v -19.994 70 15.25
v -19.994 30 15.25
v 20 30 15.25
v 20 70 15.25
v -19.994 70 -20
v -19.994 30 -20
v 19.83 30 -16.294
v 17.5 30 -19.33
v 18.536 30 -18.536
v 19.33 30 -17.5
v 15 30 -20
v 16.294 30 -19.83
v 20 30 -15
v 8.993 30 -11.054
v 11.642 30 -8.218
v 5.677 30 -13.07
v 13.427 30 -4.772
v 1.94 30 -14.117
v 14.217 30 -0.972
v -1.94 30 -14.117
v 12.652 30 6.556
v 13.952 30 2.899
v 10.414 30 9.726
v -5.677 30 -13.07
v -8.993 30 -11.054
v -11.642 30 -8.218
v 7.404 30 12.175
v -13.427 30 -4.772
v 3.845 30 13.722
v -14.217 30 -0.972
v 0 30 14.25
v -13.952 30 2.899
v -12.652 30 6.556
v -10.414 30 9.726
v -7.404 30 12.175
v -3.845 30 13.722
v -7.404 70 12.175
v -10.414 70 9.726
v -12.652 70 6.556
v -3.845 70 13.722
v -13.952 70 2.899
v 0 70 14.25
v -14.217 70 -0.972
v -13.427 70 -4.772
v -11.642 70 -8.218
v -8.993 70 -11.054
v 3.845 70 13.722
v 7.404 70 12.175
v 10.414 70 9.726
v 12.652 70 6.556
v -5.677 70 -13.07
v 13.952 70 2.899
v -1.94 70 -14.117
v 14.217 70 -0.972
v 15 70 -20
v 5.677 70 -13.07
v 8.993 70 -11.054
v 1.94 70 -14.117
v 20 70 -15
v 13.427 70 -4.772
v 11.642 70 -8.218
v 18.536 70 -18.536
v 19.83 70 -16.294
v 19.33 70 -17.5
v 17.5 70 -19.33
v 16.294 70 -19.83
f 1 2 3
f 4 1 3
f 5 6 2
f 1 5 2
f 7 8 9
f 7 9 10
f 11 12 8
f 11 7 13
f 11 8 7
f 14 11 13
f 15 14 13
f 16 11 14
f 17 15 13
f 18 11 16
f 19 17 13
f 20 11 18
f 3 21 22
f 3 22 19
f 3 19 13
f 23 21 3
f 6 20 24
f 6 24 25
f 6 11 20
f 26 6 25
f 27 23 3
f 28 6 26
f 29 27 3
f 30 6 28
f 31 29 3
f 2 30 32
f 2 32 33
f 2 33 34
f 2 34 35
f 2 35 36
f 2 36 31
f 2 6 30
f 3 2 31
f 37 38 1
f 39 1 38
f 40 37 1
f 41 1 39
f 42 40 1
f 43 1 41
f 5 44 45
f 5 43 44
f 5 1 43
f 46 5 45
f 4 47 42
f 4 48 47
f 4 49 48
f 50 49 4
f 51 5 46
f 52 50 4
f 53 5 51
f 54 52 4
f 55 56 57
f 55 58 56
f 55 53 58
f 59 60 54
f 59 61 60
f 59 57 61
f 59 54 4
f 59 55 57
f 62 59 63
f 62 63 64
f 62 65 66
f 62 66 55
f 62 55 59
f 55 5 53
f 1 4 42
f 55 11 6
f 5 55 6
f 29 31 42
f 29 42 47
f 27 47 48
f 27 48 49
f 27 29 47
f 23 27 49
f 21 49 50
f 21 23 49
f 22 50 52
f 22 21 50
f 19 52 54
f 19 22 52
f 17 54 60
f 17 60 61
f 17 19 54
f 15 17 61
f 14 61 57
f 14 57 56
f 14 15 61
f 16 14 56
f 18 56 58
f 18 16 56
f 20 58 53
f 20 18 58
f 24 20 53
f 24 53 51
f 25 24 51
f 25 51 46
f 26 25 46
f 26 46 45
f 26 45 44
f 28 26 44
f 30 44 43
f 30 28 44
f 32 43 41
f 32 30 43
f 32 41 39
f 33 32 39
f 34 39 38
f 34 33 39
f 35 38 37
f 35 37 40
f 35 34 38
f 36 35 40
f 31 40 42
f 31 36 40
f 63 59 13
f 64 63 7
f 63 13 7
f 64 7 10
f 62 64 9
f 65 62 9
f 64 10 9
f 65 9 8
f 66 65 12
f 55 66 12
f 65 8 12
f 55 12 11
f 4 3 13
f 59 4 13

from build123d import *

# Parameters (mm, degrees)
CROQUIS1_R                              = 15.25
CROQUIS1_R_2                            = 2.125
SOPORTE_CAJA_REDUCTORA_DEPTH            = 20
CROQUIS3_R                              = 2.125
CORTAR_EXTRUIR1_DEPTH                   = 51.423828692
REDONDEO1_R                             = 5
BOSS_EXTRUDE1_DEPTH                     = 20
CUT_EXTRUDE1_REACH                      = 55.852
SKETCH2_R                               = 1.625
CUT_EXTRUDE2_DEPTH                      = 2
SKETCH4_R                               = 1.625
CUT_EXTRUDE3_DEPTH                      = 63.291652731
CUT_EXTRUDE4_START                      = -4.5
CUT_EXTRUDE4_DEPTH                      = 2
CROQUIS6_W                              = 4.75
CROQUIS6_H                              = 4.75
CORTAR_EXTRUIR17_DEPTH                  = 42.231056256
CROQUIS7_W                              = 60
CROQUIS7_H                              = 20
CORTAR_EXTRUIR18_DEPTH                  = 51.423828692
SALIENTE_EXTRUIR2_DEPTH                 = 49
SOPORTE_START                           = -15
SOPORTE_MOTOR_DEPTH                     = 15
CROQUIS12_R                             = 2.125
AGUJEROS_DE_SUJECION_A_BASE_DEPTH       = 84.087679592
TUERCA_START                            = -4
TUERCA_AGUJERO_DE_SUJECION_A_BASE_DEPTH = 10
SALIENTE_EXTRUIR4_DEPTH                 = 15
CORTAR_EXTRUIR19_DEPTH                  = 25
CROQUIS14_W                             = 50
CROQUIS14_H                             = 118
CORTAR_EXTRUIR22_DEPTH                  = 146.556045907
CROQUIS15_W                             = 10
CROQUIS15_H                             = 7
CORTAR_EXTRUIR23_DEPTH                  = 42.231056256
CORTAR_EXTRUIR24_DEPTH                  = 42.231056256
CROQUIS18_W                             = 40
CROQUIS18_H                             = 10
CORTAR_EXTRUIR25_DEPTH                  = 44.27311521
SALIENTE_EXTRUIR5_DEPTH                 = 10
CROQUIS20_R                             = 1
CORTAR_EXTRUIR26_DEPTH                  = 49.229270158
CORTAR_EXTRUIR27_REACH                  = 62.959
CORTAR_EXTRUIR27_END_RADIUS             = 15.25
CROQUIS21_R                             = 1.625
CROQUIS22_R                             = 2.125
CROQUIS22_R_2                           = 1
SALIENTE_EXTRUIR6_DEPTH                 = 10
CROQUIS23_R                             = 1.625
CORTAR_EXTRUIR28_DEPTH                  = 52.269508521
CORTAR_EXTRUIR29_START                  = -3
CORTAR_EXTRUIR29_DEPTH                  = 10
SALIENTE_EXTRUIR7_DEPTH                 = 10
CORTAR_EXTRUIR30_REACH                  = 72.235
CROQUIS27_R                             = 1.625
CORTAR_EXTRUIR31_REACH                  = 75.235
CORTAR_EXTRUIR31_START                  = -3
CORTAR_EXTRUIR32_REACH                  = 58.612
CROQUIS29_R                             = 1.625
CORTAR_EXTRUIR33_REACH                  = 61.112
CORTAR_EXTRUIR33_START                  = -2.5
CROQUIS35_W                             = 13.305418987
CROQUIS35_H                             = 6.826864192
CORTAR_EXTRUIR34_DEPTH                  = 63.931555098
CORTAR_EXTRUIR34_DEPTH_BACK             = 63.931555098
CORTAR_EXTRUIR35_START                  = -3
CORTAR_EXTRUIR35_DEPTH                  = 10
SALIENTE_EXTRUIR8_DEPTH                 = 10
SALIENTE_EXTRUIR9_DEPTH                 = 13
SALIENTE_EXTRUIR10_DEPTH                = 3
CROQUIS40_W                             = 106.583537839
CROQUIS40_H                             = 47.391515964
CORTAR_EXTRUIR36_DEPTH                  = 80.887064817
CORTAR_EXTRUIR36_DEPTH_BACK             = 80.887064817
CORTAR_EXTRUIR37_DEPTH                  = 67.2524009
CORTAR_EXTRUIR37_DEPTH_BACK             = 67.2524009
CORTAR_EXTRUIR38_DEPTH                  = 79.704784639
CORTAR_EXTRUIR38_DEPTH_BACK             = 79.704784639
SALIENTE_EXTRUIR11_DEPTH                = 10
CORTAR_EXTRUIR39_DEPTH                  = 63.9908649
CROQUIS45_W                             = 31.470301378
CROQUIS45_H                             = 10
CROQUIS45_R                             = 1.625
SALIENTE_EXTRUIR12_DEPTH                = 2.5
SALIENTE_EXTRUIR13_DEPTH                = 10
CORTAR_EXTRUIR40_START                  = -2
CROQUIS47_R                             = 1.625
CORTAR_EXTRUIR40_DEPTH                  = 10
CORTAR_EXTRUIR41_START                  = -12
CROQUIS48_R                             = 1.625
CORTAR_EXTRUIR41_DEPTH                  = 12
CROQUIS49_W                             = 34.796066513
CROQUIS49_H                             = 42.211026982
CORTAR_EXTRUIR42_DEPTH                  = 52.795622989
CORTAR_EXTRUIR42_DEPTH_BACK             = 52.795622989
CROQUIS51_R                             = 15.25
CROQUIS51_R_2                           = 14.25
SALIENTE_EXTRUIR14_DEPTH                = 10
CORTAR_EXTRUIR43_DEPTH                  = 10
CORTAR_EXTRUIR44_DEPTH                  = 10
CORTAR_EXTRUIR45_DEPTH                  = 10
SALIENTE_EXTRUIR15_DEPTH                = 10
CROQUIS56_R                             = 14.25
SALIENTE_EXTRUIR16_DEPTH                = 40
CROQUIS57_W                             = 35.25
CROQUIS57_H                             = 10
CORTAR_EXTRUIR46_DEPTH                  = 84.0631572
CORTAR_EXTRUIR46_DEPTH_BACK             = 84.0631572


with BuildPart() as part:
    # Croquis1 → Soporte caja reductora (new body)
    with BuildSketch(Plane(origin=(0, 0, 0), x_dir=(1, 0, 0), z_dir=(0, 1, 0))):
        Polygon((-30, -15.25), (-20, -15.25), (-20, -20), (20, -20), (20, -15.25), (30, -15.25), (30, -7.25), (20, -4.25), (20, 20), (-20, 20), (-20, -4.25), (-30, -7.25), align=None)
        with Locations(Location((0, 0, 0), (0, 0, 270))):
            Circle(CROQUIS1_R, mode=Mode.SUBTRACT)
        with Locations(Location((-15, 15, 0), (0, 0, 270))):
            Circle(CROQUIS1_R_2, mode=Mode.SUBTRACT)
        with Locations(Location((15, 15, 0), (0, 0, 270))):
            Circle(CROQUIS1_R_2, mode=Mode.SUBTRACT)
    extrude(amount=-SOPORTE_CAJA_REDUCTORA_DEPTH)

    # Croquis3 → Cortar-Extruir1 (cut, through all)
    with BuildSketch(Plane.XY.offset(15.25)):
        with Locations((-23.5, -10)):
            Circle(CROQUIS3_R)
        with Locations((23.5, -10)):
            Circle(CROQUIS3_R)
    extrude(amount=-CORTAR_EXTRUIR1_DEPTH, mode=Mode.SUBTRACT)

    # Redondeo1
    redondeo1_edges = [part.edges().sort_by_distance(p)[0] for p in [
        (-20, -10, -20),
        (20, -10, -20),
    ]]
    fillet(redondeo1_edges, radius=REDONDEO1_R)

    # Sketch1 → Boss-Extrude1 (add)
    with BuildSketch(Plane(origin=(0, 0, 0), x_dir=(1, 0, 0), z_dir=(0, 1, 0))):
        with BuildLine():
            Line((25.5, 15), (20, 15))
            ThreePointArc((20, 15), (18.535533906, 18.535533906), (15, 20))
            Line((15, 20), (30, 20))
            Line((30, 20), (30, 8))
            Line((30, 8), (25.5, 8))
            Line((25.5, 8), (25.5, 15))
        make_face()
    extrude(amount=-BOSS_EXTRUDE1_DEPTH)

    # Sketch2 → Cut-Extrude1 (cut, up to next)
    with BuildSketch(Plane(origin=(0, 0, -20), x_dir=(-1, 0, 0), z_dir=(0, 0, -1)), mode=Mode.PRIVATE) as cut_extrude1_sk1:
        with Locations((-22.75, -10)):
            Circle(SKETCH2_R)
    cut_extrude1_tool1 = extrude(cut_extrude1_sk1.sketch, amount=-CUT_EXTRUDE1_REACH, mode=Mode.PRIVATE) & part.part
    add(cut_extrude1_tool1.solids().sort_by_distance((22.75, -10, -20))[0], mode=Mode.SUBTRACT)

    # Sketch3 → Cut-Extrude2 (cut)
    with BuildSketch(Plane.XY.offset(-15)):
        Polygon((20, -11.58771324), (22.75, -13.175426481), (25.5, -11.58771324), (25.5, -8.41228676), (22.75, -6.824573519), (20, -8.41228676), align=None)
    extrude(amount=-CUT_EXTRUDE2_DEPTH, mode=Mode.SUBTRACT)

    # Sketch4 → Cut-Extrude3 (cut, through all)
    with BuildSketch(Plane.ZY.offset(-25.5)):
        with Locations((-12.25, -10)):
            Circle(SKETCH4_R)
    extrude(amount=-CUT_EXTRUDE3_DEPTH, mode=Mode.SUBTRACT)

    # Sketch5 → Cut-Extrude4 (cut)
    with BuildSketch(Plane(origin=(30, 0, 0), x_dir=(0, 0, -1), z_dir=(1, 0, 0)).offset(CUT_EXTRUDE4_START)):
        Polygon((15, -11.58771324), (15, -8.41228676), (12.25, -6.824573519), (9.5, -8.41228676), (9.5, -11.58771324), (12.25, -13.175426481), align=None)
    extrude(amount=CUT_EXTRUDE4_DEPTH, mode=Mode.SUBTRACT)

    # Croquis6 → Cortar-Extruir17 (cut, through all)
    with BuildSketch(Plane(origin=(0, 0, 0), x_dir=(1, 0, 0), z_dir=(0, 1, 0))):
        Polygon((0, -15.25), (-15.25, -15.25), (-15.25, -20), (15.25, -20), (15.25, -15.25), align=None)
        with Locations((-17.625, -17.625)):
            Rectangle(CROQUIS6_W, CROQUIS6_H)
        with BuildLine():
            ThreePointArc((0, -15.25), (-10.783378413, -10.783378413), (-15.25, 0))
            Line((-15.25, 0), (-15.25, -15.25))
            Line((-15.25, -15.25), (0, -15.25))
        make_face()
        with BuildLine():
            Line((15.25, -15.25), (15.25, 0))
            ThreePointArc((15.25, 0), (10.783378413, -10.783378413), (0, -15.25))
            Line((0, -15.25), (15.25, -15.25))
        make_face()
        with Locations((17.625, -17.625)):
            Rectangle(CROQUIS6_W, CROQUIS6_H)
    extrude(amount=-CORTAR_EXTRUIR17_DEPTH, mode=Mode.SUBTRACT)


with BuildPart() as body_2:
    # Simetría1: mirrored copy
    add(part.part.mirror(Plane.ZX))

    # Croquis8 → Saliente-Extruir2 (add)
    with BuildSketch(Plane(origin=(0, 20, 0), x_dir=(1, 0, 0), z_dir=(0, 1, 0))):
        with BuildLine():
            Line((-12.664515522, 20), (-11.040489496, 13.939052358))
            Line((-11.040489496, 13.939052358), (-10.315162126, 11.232093763))
            ThreePointArc((-10.315162126, 11.232093763), (0, 15.25), (10.315162126, 11.232093763))
            Line((10.315162126, 11.232093763), (10.817418481, 13.87928066))
            Line((10.817418481, 13.87928066), (11.978715476, 20))
            Line((11.978715476, 20), (-12.664515522, 20))
        make_face()
    extrude(amount=SALIENTE_EXTRUIR2_DEPTH)

    # Croquis9 → Soporte motor (add)
    with BuildSketch(Plane(origin=(0, 69, 0), x_dir=(1, 0, 0), z_dir=(0, 1, 0)).offset(SOPORTE_START)):
        with BuildLine():
            Line((-20, 15), (-20, -4.25))
            Line((-20, -4.25), (-30, -7.25))
            Line((-30, -7.25), (-30, -15.25))
            Line((-30, -15.25), (0, -15.25))
            Line((0, -15.25), (0, -14.75))
            ThreePointArc((0, -14.75), (-10.429825023, 10.429825023), (14.75, 0))
            Line((14.75, 0), (20, 0))
            Line((20, 0), (20, 13.936837101))
            Line((20, 13.936837101), (12.664515522, 20))
            Line((12.664515522, 20), (-15, 20))
            ThreePointArc((-15, 20), (-18.535533906, 18.535533906), (-20, 15))
        make_face()
    extrude(amount=-SOPORTE_MOTOR_DEPTH)

    # Croquis12 → Agujeros de sujecion a base (cut, through all)
    with BuildSketch(Plane.XY.offset(15.25)):
        with Locations((-23.5, 46.5)):
            Circle(CROQUIS12_R)
    extrude(amount=-AGUJEROS_DE_SUJECION_A_BASE_DEPTH, mode=Mode.SUBTRACT)

    # Croquis13 → Tuerca Agujero de sujecion a base (cut)
    with BuildSketch(Plane.XY.offset(15.25).offset(TUERCA_START)):
        Polygon((-20, 44.479274058), (-20, 48.520725942), (-23.5, 50.541451884), (-27, 48.520725942), (-27, 44.479274058), (-23.5, 42.458548116), align=None)
    extrude(amount=-TUERCA_AGUJERO_DE_SUJECION_A_BASE_DEPTH, mode=Mode.SUBTRACT)

    # Croquis10 → Saliente-Extruir4 (add)
    with BuildSketch(Plane(origin=(0, 69, 0), x_dir=(1, 0, 0), z_dir=(0, 1, 0))):
        with BuildLine():
            ThreePointArc((10.315162126, 11.232093763), (0, 15.25), (-10.315162126, 11.232093763))
            Line((-10.315162126, 11.232093763), (-10.16850369, 10.684757026))
            ThreePointArc((-10.16850369, 10.684757026), (0, 14.75), (10.16850369, 10.684757026))
            Line((10.16850369, 10.684757026), (10.315162126, 11.232093763))
        make_face()
    extrude(amount=-SALIENTE_EXTRUIR4_DEPTH)

    # Croquis11 → Cortar-Extruir19 (cut)
    with BuildSketch(Plane.XZ):
        with BuildLine():
            Line((15.25, 4.25), (20, 4.25))
            Line((20, 4.25), (21.972856468, 4.84185694))
            ThreePointArc((21.972856468, 4.84185694), (19.948931102, 10.40625523), (16.543503257, 15.25))
            Line((16.543503257, 15.25), (15.25, 15.25))
            Line((15.25, 15.25), (15.25, 4.25))
        make_face()
        with BuildLine():
            Line((21.972856468, 4.84185694), (30, 7.25))
            Line((30, 7.25), (30, 15.25))
            Line((30, 15.25), (16.543503257, 15.25))
            ThreePointArc((16.543503257, 15.25), (19.948931102, 10.40625523), (21.972856468, 4.84185694))
        make_face()
        with BuildLine():
            ThreePointArc((20, -15), (18.535533906, -18.535533906), (15, -20))
            Line((15, -20), (30, -20))
            Line((30, -20), (30, -8))
            Line((30, -8), (25.5, -8))
            Line((25.5, -8), (25.5, -15))
            Line((25.5, -15), (20, -15))
        make_face()
    extrude(amount=-CORTAR_EXTRUIR19_DEPTH, mode=Mode.SUBTRACT)

    # Simetría2: body 2 across face


with BuildPart() as part_1:
    add(part.part)

    # Croquis7 → Cortar-Extruir18 (cut, through all)
    with BuildSketch(Plane(origin=(0, 0, -20), x_dir=(-1, 0, 0), z_dir=(0, 0, -1))):
        with Locations((0, -10)):
            Rectangle(CROQUIS7_W, CROQUIS7_H)
    extrude(amount=-CORTAR_EXTRUIR18_DEPTH, mode=Mode.SUBTRACT)


with BuildPart() as body_2_1:
    add(body_2.part)
    add(body_2.part.mirror(Plane(origin=(-0.229209569, 69, -16.663998028), x_dir=(0, 0, 1), z_dir=(0, 1, 0))))

    # Croquis14 → Cortar-Extruir22 (cut, through all)
    with BuildSketch(Plane.XY.offset(15.25)):
        with Locations((-5, 79)):
            Rectangle(CROQUIS14_W, CROQUIS14_H)
    extrude(amount=-CORTAR_EXTRUIR22_DEPTH, mode=Mode.SUBTRACT)

    # Croquis15 → Cortar-Extruir23 (cut, through all)
    with BuildSketch(Plane.XZ):
        with Locations((-25, 7.75)):
            Rectangle(CROQUIS15_W, CROQUIS15_H)
    extrude(amount=-CORTAR_EXTRUIR23_DEPTH, mode=Mode.SUBTRACT)

    # Croquis16 → Cortar-Extruir24 (cut, through all)
    with BuildSketch(Plane.XZ):
        Polygon((-30, 15.25), (-15.25, 15.25), (-15.25, 12.75), (-20, 12.75), (-20, 11.25), (-30, 11.25), (-30, 12.75), align=None)
    extrude(amount=-CORTAR_EXTRUIR24_DEPTH, mode=Mode.SUBTRACT)

    # Croquis18 → Cortar-Extruir25 (cut, through all)
    with BuildSketch(Plane(origin=(0, 0, -20), x_dir=(-1, 0, 0), z_dir=(0, 0, -1))):
        with Locations((0, 5)):
            Rectangle(CROQUIS18_W, CROQUIS18_H)
    extrude(amount=-CORTAR_EXTRUIR25_DEPTH, mode=Mode.SUBTRACT)

    # Croquis19 → Saliente-Extruir5 (add)
    with BuildSketch(Plane(origin=(0, 20, 0), x_dir=(1, 0, 0), z_dir=(0, 1, 0))):
        Polygon((-20, -12.75), (-34, -12.75), (-34, -7.75), (-24, -7.75), (-20, -3.75), align=None)
    extrude(amount=-SALIENTE_EXTRUIR5_DEPTH)

    # Croquis20 → Cortar-Extruir26 (cut, through all)
    with BuildSketch(Plane(origin=(0, 0, 7.75), x_dir=(-1, 0, 0), z_dir=(0, 0, -1))):
        with Locations((29, 15)):
            Circle(CROQUIS20_R)
    extrude(amount=-CORTAR_EXTRUIR26_DEPTH, mode=Mode.SUBTRACT)

    # Cortar-Extruir27: up to this cylinder (the profile starts outside it)
    cortar_extruir27_end = Plane(origin=(0, 15, 0), z_dir=(0, -1, 0)) * Cylinder(CORTAR_EXTRUIR27_END_RADIUS, 157.418, mode=Mode.PRIVATE)
    # Croquis21 → Cortar-Extruir27 (cut, up to the surface)
    with BuildSketch(Plane(origin=(20, 0, 0), x_dir=(0, 0, -1), z_dir=(1, 0, 0)), mode=Mode.PRIVATE) as cortar_extruir27_sk1:
        with Locations((4.75, 15)):
            Circle(CROQUIS21_R)
    cortar_extruir27_tool1 = extrude(cortar_extruir27_sk1.sketch, amount=-CORTAR_EXTRUIR27_REACH, mode=Mode.PRIVATE) - cortar_extruir27_end
    add(cortar_extruir27_tool1.solids().sort_by_distance((20, 15, -4.75))[0], mode=Mode.SUBTRACT)

    # Croquis22 → Saliente-Extruir6 (add)
    with BuildSketch(Plane.XZ.offset(-10)):
        with Locations((-15, -15)):
            Circle(CROQUIS22_R)
        with Locations(Location((-15, -15, 0), (0, 0, 270))):
            Circle(CROQUIS22_R_2, mode=Mode.SUBTRACT)
        with Locations((15, -15)):
            Circle(CROQUIS22_R)
        with Locations(Location((15, -15, 0), (0, 0, 270))):
            Circle(CROQUIS22_R_2, mode=Mode.SUBTRACT)
    extrude(amount=-SALIENTE_EXTRUIR6_DEPTH)

    # Croquis23 → Cortar-Extruir28 (cut, through all)
    with BuildSketch(Plane(origin=(0, 0, -20), x_dir=(-1, 0, 0), z_dir=(0, 0, -1))):
        with Locations((0, 15)):
            Circle(CROQUIS23_R)
    extrude(amount=-CORTAR_EXTRUIR28_DEPTH, mode=Mode.SUBTRACT)

    # Croquis24 → Cortar-Extruir29 (cut)
    with BuildSketch(Plane(origin=(0, 0, -20), x_dir=(-1, 0, 0), z_dir=(0, 0, -1)).offset(CORTAR_EXTRUIR29_START)):
        Polygon((1.58771324, 12.25), (3.175426481, 15), (1.58771324, 17.75), (-1.58771324, 17.75), (-3.175426481, 15), (-1.58771324, 12.25), align=None)
    extrude(amount=-CORTAR_EXTRUIR29_DEPTH, mode=Mode.SUBTRACT)

    # Croquis26 → Saliente-Extruir7 (add)
    with BuildSketch(Plane.XZ.offset(-10)):
        Polygon((-34, 7.75), (-34, 12.75), (-58.825, 12.75), (-39.160527763, -4.104491148), (-20, -4.104491148), (-20, -0.104491148), (-35.732113118, -0.104491148), (-29, 7.75), align=None)
        Polygon((-34.268209086, 7.75), (-39.594516123, 1.535690951), (-46.844874897, 7.75), align=None, mode=Mode.SUBTRACT)
    extrude(amount=-SALIENTE_EXTRUIR7_DEPTH)

    # Croquis27 → Cortar-Extruir30 (cut, up to next)
    with BuildSketch(Plane.XY.offset(12.75), mode=Mode.PRIVATE) as cortar_extruir30_sk1:
        with Locations((-40.544874897, 15)):
            Circle(CROQUIS27_R)
    cortar_extruir30_tool1 = extrude(cortar_extruir30_sk1.sketch, amount=-CORTAR_EXTRUIR30_REACH, mode=Mode.PRIVATE) & body_2_1.part
    # Croquis27 → Cortar-Extruir30 (cut, up to next)
    with BuildSketch(Plane.XY.offset(12.75), mode=Mode.PRIVATE) as cortar_extruir30_sk2:
        with Locations((-29, 15)):
            Circle(CROQUIS27_R)
    cortar_extruir30_tool2 = extrude(cortar_extruir30_sk2.sketch, amount=-CORTAR_EXTRUIR30_REACH, mode=Mode.PRIVATE) & body_2_1.part
    add(cortar_extruir30_tool1.solids().sort_by_distance((-40.544875, 15, 12.75))[0], mode=Mode.SUBTRACT)
    add(cortar_extruir30_tool2.solids().sort_by_distance((-29, 15, 12.75))[0], mode=Mode.SUBTRACT)

    # Croquis28 → Cortar-Extruir31 (cut, up to next)
    with BuildSketch(Plane.XY.offset(12.75).offset(CORTAR_EXTRUIR31_START), mode=Mode.PRIVATE) as cortar_extruir31_sk1:
        Polygon((-38.957161657, 12.25), (-37.369448416, 15), (-38.957161657, 17.75), (-42.132588137, 17.75), (-43.720301378, 15), (-42.132588137, 12.25), align=None)
    cortar_extruir31_tool1 = extrude(cortar_extruir31_sk1.sketch, amount=-CORTAR_EXTRUIR31_REACH, mode=Mode.PRIVATE) & body_2_1.part
    # Croquis28 → Cortar-Extruir31 (cut, up to next)
    with BuildSketch(Plane.XY.offset(12.75).offset(CORTAR_EXTRUIR31_START), mode=Mode.PRIVATE) as cortar_extruir31_sk2:
        Polygon((-27.41228676, 12.25), (-25.824573519, 15), (-27.41228676, 17.75), (-30.58771324, 17.75), (-32.175426481, 15), (-30.58771324, 12.25), align=None)
    cortar_extruir31_tool2 = extrude(cortar_extruir31_sk2.sketch, amount=-CORTAR_EXTRUIR31_REACH, mode=Mode.PRIVATE) & body_2_1.part
    add(cortar_extruir31_tool1.solids().sort_by_distance((-40.544875, 15, 9.75))[0], mode=Mode.SUBTRACT)
    add(cortar_extruir31_tool2.solids().sort_by_distance((-29, 15, 9.75))[0], mode=Mode.SUBTRACT)

    # Croquis29 → Cortar-Extruir32 (cut, up to next)
    with BuildSketch(Plane(origin=(-18.612848159, 0, -21.715982563), x_dir=(-0.7592713073348843, 0, 0.6507742172658468), z_dir=(-0.6507742172658468, 0, -0.7592713073348843)), mode=Mode.PRIVATE) as cortar_extruir32_sk1:
        with Locations((33.812368097, 15)):
            Circle(CROQUIS29_R)
    cortar_extruir32_tool1 = extrude(cortar_extruir32_sk1.sketch, amount=-CORTAR_EXTRUIR32_REACH, mode=Mode.PRIVATE) & body_2_1.part
    add(cortar_extruir32_tool1.solids().sort_by_distance((-44.285609, 15, 0.288235))[0], mode=Mode.SUBTRACT)

    # Croquis31 → Cortar-Extruir33 (cut, up to next)
    with BuildSketch(Plane(origin=(-18.612848159, 0, -21.715982563), x_dir=(-0.7592713073348843, 0, 0.6507742172658468), z_dir=(-0.6507742172658468, 0, -0.7592713073348843)).offset(CORTAR_EXTRUIR33_START), mode=Mode.PRIVATE) as cortar_extruir33_sk1:
        Polygon((36.562368097, 16.58771324), (33.812368097, 18.175426481), (31.062368097, 16.58771324), (31.062368097, 13.41228676), (33.812368097, 11.824573519), (36.562368097, 13.41228676), align=None)
    cortar_extruir33_tool1 = extrude(cortar_extruir33_sk1.sketch, amount=-CORTAR_EXTRUIR33_REACH, mode=Mode.PRIVATE) & body_2_1.part
    add(cortar_extruir33_tool1.solids().sort_by_distance((-42.658674, 15, 2.186413))[0], mode=Mode.SUBTRACT)

    # Croquis35 → Cortar-Extruir34 (cut, two sides)
    with BuildSketch(Plane(origin=(0, 20, 0), x_dir=(1, 0, 0), z_dir=(0, 1, 0))) as cortar_extruir34_sk:
        with Locations((17.04227466, -3.413432096)):
            Rectangle(CROQUIS35_W, CROQUIS35_H)
    extrude(amount=CORTAR_EXTRUIR34_DEPTH, mode=Mode.SUBTRACT)
    extrude(cortar_extruir34_sk.sketch, amount=-CORTAR_EXTRUIR34_DEPTH_BACK, mode=Mode.SUBTRACT)

    # Croquis36 → Cortar-Extruir35 (cut)
    with BuildSketch(Plane(origin=(20, 0, 0), x_dir=(0, 0, -1), z_dir=(1, 0, 0)).offset(CORTAR_EXTRUIR35_START)):
        Polygon((7.5, 16.58771324), (4.75, 18.175426481), (2, 16.58771324), (2, 13.41228676), (4.75, 11.824573519), (7.5, 13.41228676), align=None)
    extrude(amount=-CORTAR_EXTRUIR35_DEPTH, mode=Mode.SUBTRACT)

    # Croquis37 → Saliente-Extruir8 (add)
    with BuildSketch(Plane.XZ.offset(-10)):
        Polygon((-39.160527763, -4.104491148), (-20.614919368, -20), (-15, -20), (-19.558128305, -15.637570403), (-33.014002756, -4.104491148), align=None)
    extrude(amount=-SALIENTE_EXTRUIR8_DEPTH)

    # Croquis38 → Saliente-Extruir9 (add)
    with BuildSketch(Plane.XZ.offset(-10)):
        Polygon((-58.825, 12.75), (-38.825, 12.75), (-38.825, 9.75), (-55.324839942, 9.75), align=None)
    extrude(amount=SALIENTE_EXTRUIR9_DEPTH)

    # Croquis39 → Saliente-Extruir10 (add)
    with BuildSketch(Plane.XZ.offset(-10)):
        Polygon((-38.825, 9.75), (-38.825, 7.75), (-38.825, 5.75), (-50.657959865, 5.75), (-52.991399903, 7.75), (-55.324839942, 9.75), align=None)
    extrude(amount=SALIENTE_EXTRUIR10_DEPTH)

    # Simetría3: body 2 across face


with BuildPart() as body_2_2:
    add(body_2_1.part)
    add(body_2_1.part.mirror(Plane(origin=(-18.003999227, 20, -4.220503046), x_dir=(0, 0, 1), z_dir=(0, 1, 0))))

    # Croquis40 → Cortar-Extruir36 (cut, two sides)
    with BuildSketch(Plane(origin=(0, 0, -20), x_dir=(-1, 0, 0), z_dir=(0, 0, -1))) as cortar_extruir36_sk:
        with Locations((22.395502026, -3.695757982)):
            Rectangle(CROQUIS40_W, CROQUIS40_H)
    extrude(amount=CORTAR_EXTRUIR36_DEPTH, mode=Mode.SUBTRACT)
    extrude(cortar_extruir36_sk.sketch, amount=-CORTAR_EXTRUIR36_DEPTH_BACK, mode=Mode.SUBTRACT)

    # Croquis41 → Cortar-Extruir37 (cut, two sides)
    with BuildSketch(Plane.XZ.offset(-20)) as cortar_extruir37_sk:
        Polygon((-19.992980133, -22.302484261), (-20, 3.75), (-24, 7.75), (-56.035110209, 7.75), align=None)
    extrude(amount=CORTAR_EXTRUIR37_DEPTH, mode=Mode.SUBTRACT)
    extrude(cortar_extruir37_sk.sketch, amount=-CORTAR_EXTRUIR37_DEPTH_BACK, mode=Mode.SUBTRACT)

    # Croquis42 → Cortar-Extruir38 (cut, two sides)
    with BuildSketch(Plane(origin=(0, 0, 9.75), x_dir=(-1, 0, 0), z_dir=(0, 0, -1))) as cortar_extruir38_sk:
        Polygon((46.720301378, 20), (46.720301378, 30), (38.825, 30), (33.492952769, 43.760628779), (49.525340398, 48.951442806), (67.200390695, 42.512205152), (65.906601328, 20), (51.713995885, 13.864168239), align=None)
    extrude(amount=CORTAR_EXTRUIR38_DEPTH, mode=Mode.SUBTRACT)
    extrude(cortar_extruir38_sk.sketch, amount=-CORTAR_EXTRUIR38_DEPTH_BACK, mode=Mode.SUBTRACT)

    # Croquis43 → Saliente-Extruir11 (add)
    with BuildSketch(Plane.XZ.offset(-20)):
        Polygon((-19.993600539, -20), (-46.720301378, 7.75), (-43.839252857, 10.524807997), (-17.112552018, -17.225192003), align=None)
    extrude(amount=-SALIENTE_EXTRUIR11_DEPTH)

    # Croquis44 → Cortar-Extruir39 (cut, through all)
    with BuildSketch(Plane(origin=(0, 0, 9.75), x_dir=(-1, 0, 0), z_dir=(0, 0, -1))):
        Polygon((38.957161657, 27.75), (37.369448416, 25), (38.957161657, 22.25), (42.132588137, 22.25), (43.720301378, 25), (42.132588137, 27.75), align=None)
    extrude(amount=CORTAR_EXTRUIR39_DEPTH, mode=Mode.SUBTRACT)

    # Croquis45 → Saliente-Extruir12 (add)
    with BuildSketch(Plane.XY.offset(12.75)):
        with Locations((-30.985150689, 25)):
            Rectangle(CROQUIS45_W, CROQUIS45_H)
        with Locations((-40.544874897, 25)):
            Circle(CROQUIS45_R, mode=Mode.SUBTRACT)
        with Locations((-29, 25)):
            Circle(CROQUIS45_R, mode=Mode.SUBTRACT)
    extrude(amount=SALIENTE_EXTRUIR12_DEPTH)

    # Croquis46 → Saliente-Extruir13 (add)
    with BuildSketch(Plane.XZ.offset(-20)):
        with BuildLine():
            Line((15.25, 0), (20, 0))
            Line((20, 0), (20, 15.25))
            Line((20, 15.25), (7.549834435, 15.25))
            Line((7.549834435, 15.25), (7.549834435, 13.25))
            ThreePointArc((7.549834435, 13.25), (13.185171124, 7.662490615), (15.25, 0))
        make_face()
        with BuildLine():
            Line((-15.25, 0), (-15.25, 15.25))
            Line((-15.25, 15.25), (-7.549834435, 15.25))
            Line((-7.549834435, 15.25), (-7.549834435, 13.25))
            ThreePointArc((-7.549834435, 13.25), (-13.185171124, 7.662490615), (-15.25, 0))
        make_face()
    extrude(amount=-SALIENTE_EXTRUIR13_DEPTH)

    # Croquis47 → Cortar-Extruir40 (cut)
    with BuildSketch(Plane.XY.offset(15.25).offset(CORTAR_EXTRUIR40_START)):
        Polygon((15.41228676, 22.352505966), (17, 25.102505966), (15.41228676, 27.852505966), (12.236860279, 27.852505966), (10.649147039, 25.102505966), (12.236860279, 22.352505966), align=None)
        with Locations((13.824573519, 25.102505966)):
            Circle(CROQUIS47_R, mode=Mode.SUBTRACT)
        Polygon((-12.236860279, 22.352505966), (-15.41228676, 22.352505966), (-17, 25.102505966), (-15.41228676, 27.852505966), (-12.236860279, 27.852505966), (-10.649147039, 25.102505966), align=None)
        with Locations(Location((-13.824573519, 25.102505966, 0), (0, 0, 131.421584744))):
            Circle(CROQUIS47_R, mode=Mode.SUBTRACT)
    extrude(amount=-CORTAR_EXTRUIR40_DEPTH, mode=Mode.SUBTRACT)

    # Croquis48 → Cortar-Extruir41 (cut)
    with BuildSketch(Plane.XY.offset(15.25).offset(CORTAR_EXTRUIR41_START)):
        with Locations((13.824573519, 25.102505966)):
            Circle(CROQUIS48_R)
        with Locations((-13.824573519, 25.102505966)):
            Circle(CROQUIS48_R)
    extrude(amount=CORTAR_EXTRUIR41_DEPTH, mode=Mode.SUBTRACT)

    # Croquis49 → Cortar-Extruir42 (cut, two sides)
    with BuildSketch(Plane.XZ.offset(-20)) as cortar_extruir42_sk:
        with Locations((-37.391633796, 1.105513491)):
            Rectangle(CROQUIS49_W, CROQUIS49_H)
    extrude(amount=CORTAR_EXTRUIR42_DEPTH, mode=Mode.SUBTRACT)
    extrude(cortar_extruir42_sk.sketch, amount=-CORTAR_EXTRUIR42_DEPTH_BACK, mode=Mode.SUBTRACT)

    # Croquis51 → Saliente-Extruir14 (add)
    with BuildSketch(Plane(origin=(0, 30, 0), x_dir=(1, 0, 0), z_dir=(0, 1, 0))):
        Circle(CROQUIS51_R)
        with Locations(Location((0, 0, 0), (0, 0, 270))):
            Circle(CROQUIS51_R_2, mode=Mode.SUBTRACT)
    extrude(amount=-SALIENTE_EXTRUIR14_DEPTH)

    # Croquis52 → Cortar-Extruir43 (cut)
    with BuildSketch(Plane(origin=(0, 0, 13.25), x_dir=(-1, 0, 0), z_dir=(0, 0, -1))):
        Polygon((-10.649147039, 25.102505966), (-12.236860279, 27.852505966), (-15.41228676, 27.852505966), (-17, 25.102505966), (-15.41228676, 22.352505966), (-12.236860279, 22.352505966), align=None)
        Polygon((17, 25.102505966), (15.41228676, 27.852505966), (12.236860279, 27.852505966), (10.649147039, 25.102505966), (12.236860279, 22.352505966), (15.41228676, 22.352505966), align=None)
    extrude(amount=CORTAR_EXTRUIR43_DEPTH, mode=Mode.SUBTRACT)

    # Croquis53 → Cortar-Extruir44 (cut)
    with BuildSketch(Plane.XY.offset(-17)):
        Polygon((3.175426481, 25), (1.58771324, 27.75), (-1.58771324, 27.75), (-3.175426481, 25), (-1.58771324, 22.25), (1.58771324, 22.25), align=None)
    extrude(amount=CORTAR_EXTRUIR44_DEPTH, mode=Mode.SUBTRACT)

    # Croquis54 → Cortar-Extruir45 (cut)
    with BuildSketch(Plane.ZY.offset(-17)):
        Polygon((-4.75, 28.175426481), (-7.5, 26.58771324), (-7.5, 23.41228676), (-4.75, 21.824573519), (-2, 23.41228676), (-2, 26.58771324), align=None)
    extrude(amount=CORTAR_EXTRUIR45_DEPTH, mode=Mode.SUBTRACT)

    # Croquis55 → Saliente-Extruir15 (add)
    with BuildSketch(Plane(origin=(0, 30, 0), x_dir=(1, 0, 0), z_dir=(0, 1, 0))):
        with BuildLine():
            Line((-7.549834435, -13.25), (-7.549834435, -15.25))
            Line((-7.549834435, -15.25), (0, -15.25))
            ThreePointArc((0, -15.25), (-3.905124838, -14.741522988), (-7.549834435, -13.25))
        make_face()
        with BuildLine():
            ThreePointArc((7.549834435, -13.25), (3.905124838, -14.741522988), (0, -15.25))
            Line((0, -15.25), (7.549834435, -15.25))
            Line((7.549834435, -15.25), (7.549834435, -13.25))
        make_face()
    extrude(amount=-SALIENTE_EXTRUIR15_DEPTH)

    # Croquis56 → Saliente-Extruir16 (add)
    with BuildSketch(Plane(origin=(0, 30, 0), x_dir=(1, 0, 0), z_dir=(0, 1, 0))):
        with BuildLine():
            Line((20, -15.25), (20, 15))
            ThreePointArc((20, 15), (18.535533906, 18.535533906), (15, 20))
            Line((15, 20), (-19.993600539, 20))
            Line((-19.993600539, 20), (-19.993600539, -15.25))
            Line((-19.993600539, -15.25), (20, -15.25))
        make_face()
        with Locations(Location((0, 0, 0), (0, 0, 270))):
            Circle(CROQUIS56_R, mode=Mode.SUBTRACT)
    extrude(amount=SALIENTE_EXTRUIR16_DEPTH)

    # Croquis57 → Cortar-Extruir46 (cut, two sides)
    with BuildSketch(Plane.ZY.offset(19.993600539)) as cortar_extruir46_sk:
        with Locations((-2.375, 25)):
            Rectangle(CROQUIS57_W, CROQUIS57_H)
    extrude(amount=CORTAR_EXTRUIR46_DEPTH, mode=Mode.SUBTRACT)
    extrude(cortar_extruir46_sk.sketch, amount=-CORTAR_EXTRUIR46_DEPTH_BACK, mode=Mode.SUBTRACT)


solid = body_2_2.part
